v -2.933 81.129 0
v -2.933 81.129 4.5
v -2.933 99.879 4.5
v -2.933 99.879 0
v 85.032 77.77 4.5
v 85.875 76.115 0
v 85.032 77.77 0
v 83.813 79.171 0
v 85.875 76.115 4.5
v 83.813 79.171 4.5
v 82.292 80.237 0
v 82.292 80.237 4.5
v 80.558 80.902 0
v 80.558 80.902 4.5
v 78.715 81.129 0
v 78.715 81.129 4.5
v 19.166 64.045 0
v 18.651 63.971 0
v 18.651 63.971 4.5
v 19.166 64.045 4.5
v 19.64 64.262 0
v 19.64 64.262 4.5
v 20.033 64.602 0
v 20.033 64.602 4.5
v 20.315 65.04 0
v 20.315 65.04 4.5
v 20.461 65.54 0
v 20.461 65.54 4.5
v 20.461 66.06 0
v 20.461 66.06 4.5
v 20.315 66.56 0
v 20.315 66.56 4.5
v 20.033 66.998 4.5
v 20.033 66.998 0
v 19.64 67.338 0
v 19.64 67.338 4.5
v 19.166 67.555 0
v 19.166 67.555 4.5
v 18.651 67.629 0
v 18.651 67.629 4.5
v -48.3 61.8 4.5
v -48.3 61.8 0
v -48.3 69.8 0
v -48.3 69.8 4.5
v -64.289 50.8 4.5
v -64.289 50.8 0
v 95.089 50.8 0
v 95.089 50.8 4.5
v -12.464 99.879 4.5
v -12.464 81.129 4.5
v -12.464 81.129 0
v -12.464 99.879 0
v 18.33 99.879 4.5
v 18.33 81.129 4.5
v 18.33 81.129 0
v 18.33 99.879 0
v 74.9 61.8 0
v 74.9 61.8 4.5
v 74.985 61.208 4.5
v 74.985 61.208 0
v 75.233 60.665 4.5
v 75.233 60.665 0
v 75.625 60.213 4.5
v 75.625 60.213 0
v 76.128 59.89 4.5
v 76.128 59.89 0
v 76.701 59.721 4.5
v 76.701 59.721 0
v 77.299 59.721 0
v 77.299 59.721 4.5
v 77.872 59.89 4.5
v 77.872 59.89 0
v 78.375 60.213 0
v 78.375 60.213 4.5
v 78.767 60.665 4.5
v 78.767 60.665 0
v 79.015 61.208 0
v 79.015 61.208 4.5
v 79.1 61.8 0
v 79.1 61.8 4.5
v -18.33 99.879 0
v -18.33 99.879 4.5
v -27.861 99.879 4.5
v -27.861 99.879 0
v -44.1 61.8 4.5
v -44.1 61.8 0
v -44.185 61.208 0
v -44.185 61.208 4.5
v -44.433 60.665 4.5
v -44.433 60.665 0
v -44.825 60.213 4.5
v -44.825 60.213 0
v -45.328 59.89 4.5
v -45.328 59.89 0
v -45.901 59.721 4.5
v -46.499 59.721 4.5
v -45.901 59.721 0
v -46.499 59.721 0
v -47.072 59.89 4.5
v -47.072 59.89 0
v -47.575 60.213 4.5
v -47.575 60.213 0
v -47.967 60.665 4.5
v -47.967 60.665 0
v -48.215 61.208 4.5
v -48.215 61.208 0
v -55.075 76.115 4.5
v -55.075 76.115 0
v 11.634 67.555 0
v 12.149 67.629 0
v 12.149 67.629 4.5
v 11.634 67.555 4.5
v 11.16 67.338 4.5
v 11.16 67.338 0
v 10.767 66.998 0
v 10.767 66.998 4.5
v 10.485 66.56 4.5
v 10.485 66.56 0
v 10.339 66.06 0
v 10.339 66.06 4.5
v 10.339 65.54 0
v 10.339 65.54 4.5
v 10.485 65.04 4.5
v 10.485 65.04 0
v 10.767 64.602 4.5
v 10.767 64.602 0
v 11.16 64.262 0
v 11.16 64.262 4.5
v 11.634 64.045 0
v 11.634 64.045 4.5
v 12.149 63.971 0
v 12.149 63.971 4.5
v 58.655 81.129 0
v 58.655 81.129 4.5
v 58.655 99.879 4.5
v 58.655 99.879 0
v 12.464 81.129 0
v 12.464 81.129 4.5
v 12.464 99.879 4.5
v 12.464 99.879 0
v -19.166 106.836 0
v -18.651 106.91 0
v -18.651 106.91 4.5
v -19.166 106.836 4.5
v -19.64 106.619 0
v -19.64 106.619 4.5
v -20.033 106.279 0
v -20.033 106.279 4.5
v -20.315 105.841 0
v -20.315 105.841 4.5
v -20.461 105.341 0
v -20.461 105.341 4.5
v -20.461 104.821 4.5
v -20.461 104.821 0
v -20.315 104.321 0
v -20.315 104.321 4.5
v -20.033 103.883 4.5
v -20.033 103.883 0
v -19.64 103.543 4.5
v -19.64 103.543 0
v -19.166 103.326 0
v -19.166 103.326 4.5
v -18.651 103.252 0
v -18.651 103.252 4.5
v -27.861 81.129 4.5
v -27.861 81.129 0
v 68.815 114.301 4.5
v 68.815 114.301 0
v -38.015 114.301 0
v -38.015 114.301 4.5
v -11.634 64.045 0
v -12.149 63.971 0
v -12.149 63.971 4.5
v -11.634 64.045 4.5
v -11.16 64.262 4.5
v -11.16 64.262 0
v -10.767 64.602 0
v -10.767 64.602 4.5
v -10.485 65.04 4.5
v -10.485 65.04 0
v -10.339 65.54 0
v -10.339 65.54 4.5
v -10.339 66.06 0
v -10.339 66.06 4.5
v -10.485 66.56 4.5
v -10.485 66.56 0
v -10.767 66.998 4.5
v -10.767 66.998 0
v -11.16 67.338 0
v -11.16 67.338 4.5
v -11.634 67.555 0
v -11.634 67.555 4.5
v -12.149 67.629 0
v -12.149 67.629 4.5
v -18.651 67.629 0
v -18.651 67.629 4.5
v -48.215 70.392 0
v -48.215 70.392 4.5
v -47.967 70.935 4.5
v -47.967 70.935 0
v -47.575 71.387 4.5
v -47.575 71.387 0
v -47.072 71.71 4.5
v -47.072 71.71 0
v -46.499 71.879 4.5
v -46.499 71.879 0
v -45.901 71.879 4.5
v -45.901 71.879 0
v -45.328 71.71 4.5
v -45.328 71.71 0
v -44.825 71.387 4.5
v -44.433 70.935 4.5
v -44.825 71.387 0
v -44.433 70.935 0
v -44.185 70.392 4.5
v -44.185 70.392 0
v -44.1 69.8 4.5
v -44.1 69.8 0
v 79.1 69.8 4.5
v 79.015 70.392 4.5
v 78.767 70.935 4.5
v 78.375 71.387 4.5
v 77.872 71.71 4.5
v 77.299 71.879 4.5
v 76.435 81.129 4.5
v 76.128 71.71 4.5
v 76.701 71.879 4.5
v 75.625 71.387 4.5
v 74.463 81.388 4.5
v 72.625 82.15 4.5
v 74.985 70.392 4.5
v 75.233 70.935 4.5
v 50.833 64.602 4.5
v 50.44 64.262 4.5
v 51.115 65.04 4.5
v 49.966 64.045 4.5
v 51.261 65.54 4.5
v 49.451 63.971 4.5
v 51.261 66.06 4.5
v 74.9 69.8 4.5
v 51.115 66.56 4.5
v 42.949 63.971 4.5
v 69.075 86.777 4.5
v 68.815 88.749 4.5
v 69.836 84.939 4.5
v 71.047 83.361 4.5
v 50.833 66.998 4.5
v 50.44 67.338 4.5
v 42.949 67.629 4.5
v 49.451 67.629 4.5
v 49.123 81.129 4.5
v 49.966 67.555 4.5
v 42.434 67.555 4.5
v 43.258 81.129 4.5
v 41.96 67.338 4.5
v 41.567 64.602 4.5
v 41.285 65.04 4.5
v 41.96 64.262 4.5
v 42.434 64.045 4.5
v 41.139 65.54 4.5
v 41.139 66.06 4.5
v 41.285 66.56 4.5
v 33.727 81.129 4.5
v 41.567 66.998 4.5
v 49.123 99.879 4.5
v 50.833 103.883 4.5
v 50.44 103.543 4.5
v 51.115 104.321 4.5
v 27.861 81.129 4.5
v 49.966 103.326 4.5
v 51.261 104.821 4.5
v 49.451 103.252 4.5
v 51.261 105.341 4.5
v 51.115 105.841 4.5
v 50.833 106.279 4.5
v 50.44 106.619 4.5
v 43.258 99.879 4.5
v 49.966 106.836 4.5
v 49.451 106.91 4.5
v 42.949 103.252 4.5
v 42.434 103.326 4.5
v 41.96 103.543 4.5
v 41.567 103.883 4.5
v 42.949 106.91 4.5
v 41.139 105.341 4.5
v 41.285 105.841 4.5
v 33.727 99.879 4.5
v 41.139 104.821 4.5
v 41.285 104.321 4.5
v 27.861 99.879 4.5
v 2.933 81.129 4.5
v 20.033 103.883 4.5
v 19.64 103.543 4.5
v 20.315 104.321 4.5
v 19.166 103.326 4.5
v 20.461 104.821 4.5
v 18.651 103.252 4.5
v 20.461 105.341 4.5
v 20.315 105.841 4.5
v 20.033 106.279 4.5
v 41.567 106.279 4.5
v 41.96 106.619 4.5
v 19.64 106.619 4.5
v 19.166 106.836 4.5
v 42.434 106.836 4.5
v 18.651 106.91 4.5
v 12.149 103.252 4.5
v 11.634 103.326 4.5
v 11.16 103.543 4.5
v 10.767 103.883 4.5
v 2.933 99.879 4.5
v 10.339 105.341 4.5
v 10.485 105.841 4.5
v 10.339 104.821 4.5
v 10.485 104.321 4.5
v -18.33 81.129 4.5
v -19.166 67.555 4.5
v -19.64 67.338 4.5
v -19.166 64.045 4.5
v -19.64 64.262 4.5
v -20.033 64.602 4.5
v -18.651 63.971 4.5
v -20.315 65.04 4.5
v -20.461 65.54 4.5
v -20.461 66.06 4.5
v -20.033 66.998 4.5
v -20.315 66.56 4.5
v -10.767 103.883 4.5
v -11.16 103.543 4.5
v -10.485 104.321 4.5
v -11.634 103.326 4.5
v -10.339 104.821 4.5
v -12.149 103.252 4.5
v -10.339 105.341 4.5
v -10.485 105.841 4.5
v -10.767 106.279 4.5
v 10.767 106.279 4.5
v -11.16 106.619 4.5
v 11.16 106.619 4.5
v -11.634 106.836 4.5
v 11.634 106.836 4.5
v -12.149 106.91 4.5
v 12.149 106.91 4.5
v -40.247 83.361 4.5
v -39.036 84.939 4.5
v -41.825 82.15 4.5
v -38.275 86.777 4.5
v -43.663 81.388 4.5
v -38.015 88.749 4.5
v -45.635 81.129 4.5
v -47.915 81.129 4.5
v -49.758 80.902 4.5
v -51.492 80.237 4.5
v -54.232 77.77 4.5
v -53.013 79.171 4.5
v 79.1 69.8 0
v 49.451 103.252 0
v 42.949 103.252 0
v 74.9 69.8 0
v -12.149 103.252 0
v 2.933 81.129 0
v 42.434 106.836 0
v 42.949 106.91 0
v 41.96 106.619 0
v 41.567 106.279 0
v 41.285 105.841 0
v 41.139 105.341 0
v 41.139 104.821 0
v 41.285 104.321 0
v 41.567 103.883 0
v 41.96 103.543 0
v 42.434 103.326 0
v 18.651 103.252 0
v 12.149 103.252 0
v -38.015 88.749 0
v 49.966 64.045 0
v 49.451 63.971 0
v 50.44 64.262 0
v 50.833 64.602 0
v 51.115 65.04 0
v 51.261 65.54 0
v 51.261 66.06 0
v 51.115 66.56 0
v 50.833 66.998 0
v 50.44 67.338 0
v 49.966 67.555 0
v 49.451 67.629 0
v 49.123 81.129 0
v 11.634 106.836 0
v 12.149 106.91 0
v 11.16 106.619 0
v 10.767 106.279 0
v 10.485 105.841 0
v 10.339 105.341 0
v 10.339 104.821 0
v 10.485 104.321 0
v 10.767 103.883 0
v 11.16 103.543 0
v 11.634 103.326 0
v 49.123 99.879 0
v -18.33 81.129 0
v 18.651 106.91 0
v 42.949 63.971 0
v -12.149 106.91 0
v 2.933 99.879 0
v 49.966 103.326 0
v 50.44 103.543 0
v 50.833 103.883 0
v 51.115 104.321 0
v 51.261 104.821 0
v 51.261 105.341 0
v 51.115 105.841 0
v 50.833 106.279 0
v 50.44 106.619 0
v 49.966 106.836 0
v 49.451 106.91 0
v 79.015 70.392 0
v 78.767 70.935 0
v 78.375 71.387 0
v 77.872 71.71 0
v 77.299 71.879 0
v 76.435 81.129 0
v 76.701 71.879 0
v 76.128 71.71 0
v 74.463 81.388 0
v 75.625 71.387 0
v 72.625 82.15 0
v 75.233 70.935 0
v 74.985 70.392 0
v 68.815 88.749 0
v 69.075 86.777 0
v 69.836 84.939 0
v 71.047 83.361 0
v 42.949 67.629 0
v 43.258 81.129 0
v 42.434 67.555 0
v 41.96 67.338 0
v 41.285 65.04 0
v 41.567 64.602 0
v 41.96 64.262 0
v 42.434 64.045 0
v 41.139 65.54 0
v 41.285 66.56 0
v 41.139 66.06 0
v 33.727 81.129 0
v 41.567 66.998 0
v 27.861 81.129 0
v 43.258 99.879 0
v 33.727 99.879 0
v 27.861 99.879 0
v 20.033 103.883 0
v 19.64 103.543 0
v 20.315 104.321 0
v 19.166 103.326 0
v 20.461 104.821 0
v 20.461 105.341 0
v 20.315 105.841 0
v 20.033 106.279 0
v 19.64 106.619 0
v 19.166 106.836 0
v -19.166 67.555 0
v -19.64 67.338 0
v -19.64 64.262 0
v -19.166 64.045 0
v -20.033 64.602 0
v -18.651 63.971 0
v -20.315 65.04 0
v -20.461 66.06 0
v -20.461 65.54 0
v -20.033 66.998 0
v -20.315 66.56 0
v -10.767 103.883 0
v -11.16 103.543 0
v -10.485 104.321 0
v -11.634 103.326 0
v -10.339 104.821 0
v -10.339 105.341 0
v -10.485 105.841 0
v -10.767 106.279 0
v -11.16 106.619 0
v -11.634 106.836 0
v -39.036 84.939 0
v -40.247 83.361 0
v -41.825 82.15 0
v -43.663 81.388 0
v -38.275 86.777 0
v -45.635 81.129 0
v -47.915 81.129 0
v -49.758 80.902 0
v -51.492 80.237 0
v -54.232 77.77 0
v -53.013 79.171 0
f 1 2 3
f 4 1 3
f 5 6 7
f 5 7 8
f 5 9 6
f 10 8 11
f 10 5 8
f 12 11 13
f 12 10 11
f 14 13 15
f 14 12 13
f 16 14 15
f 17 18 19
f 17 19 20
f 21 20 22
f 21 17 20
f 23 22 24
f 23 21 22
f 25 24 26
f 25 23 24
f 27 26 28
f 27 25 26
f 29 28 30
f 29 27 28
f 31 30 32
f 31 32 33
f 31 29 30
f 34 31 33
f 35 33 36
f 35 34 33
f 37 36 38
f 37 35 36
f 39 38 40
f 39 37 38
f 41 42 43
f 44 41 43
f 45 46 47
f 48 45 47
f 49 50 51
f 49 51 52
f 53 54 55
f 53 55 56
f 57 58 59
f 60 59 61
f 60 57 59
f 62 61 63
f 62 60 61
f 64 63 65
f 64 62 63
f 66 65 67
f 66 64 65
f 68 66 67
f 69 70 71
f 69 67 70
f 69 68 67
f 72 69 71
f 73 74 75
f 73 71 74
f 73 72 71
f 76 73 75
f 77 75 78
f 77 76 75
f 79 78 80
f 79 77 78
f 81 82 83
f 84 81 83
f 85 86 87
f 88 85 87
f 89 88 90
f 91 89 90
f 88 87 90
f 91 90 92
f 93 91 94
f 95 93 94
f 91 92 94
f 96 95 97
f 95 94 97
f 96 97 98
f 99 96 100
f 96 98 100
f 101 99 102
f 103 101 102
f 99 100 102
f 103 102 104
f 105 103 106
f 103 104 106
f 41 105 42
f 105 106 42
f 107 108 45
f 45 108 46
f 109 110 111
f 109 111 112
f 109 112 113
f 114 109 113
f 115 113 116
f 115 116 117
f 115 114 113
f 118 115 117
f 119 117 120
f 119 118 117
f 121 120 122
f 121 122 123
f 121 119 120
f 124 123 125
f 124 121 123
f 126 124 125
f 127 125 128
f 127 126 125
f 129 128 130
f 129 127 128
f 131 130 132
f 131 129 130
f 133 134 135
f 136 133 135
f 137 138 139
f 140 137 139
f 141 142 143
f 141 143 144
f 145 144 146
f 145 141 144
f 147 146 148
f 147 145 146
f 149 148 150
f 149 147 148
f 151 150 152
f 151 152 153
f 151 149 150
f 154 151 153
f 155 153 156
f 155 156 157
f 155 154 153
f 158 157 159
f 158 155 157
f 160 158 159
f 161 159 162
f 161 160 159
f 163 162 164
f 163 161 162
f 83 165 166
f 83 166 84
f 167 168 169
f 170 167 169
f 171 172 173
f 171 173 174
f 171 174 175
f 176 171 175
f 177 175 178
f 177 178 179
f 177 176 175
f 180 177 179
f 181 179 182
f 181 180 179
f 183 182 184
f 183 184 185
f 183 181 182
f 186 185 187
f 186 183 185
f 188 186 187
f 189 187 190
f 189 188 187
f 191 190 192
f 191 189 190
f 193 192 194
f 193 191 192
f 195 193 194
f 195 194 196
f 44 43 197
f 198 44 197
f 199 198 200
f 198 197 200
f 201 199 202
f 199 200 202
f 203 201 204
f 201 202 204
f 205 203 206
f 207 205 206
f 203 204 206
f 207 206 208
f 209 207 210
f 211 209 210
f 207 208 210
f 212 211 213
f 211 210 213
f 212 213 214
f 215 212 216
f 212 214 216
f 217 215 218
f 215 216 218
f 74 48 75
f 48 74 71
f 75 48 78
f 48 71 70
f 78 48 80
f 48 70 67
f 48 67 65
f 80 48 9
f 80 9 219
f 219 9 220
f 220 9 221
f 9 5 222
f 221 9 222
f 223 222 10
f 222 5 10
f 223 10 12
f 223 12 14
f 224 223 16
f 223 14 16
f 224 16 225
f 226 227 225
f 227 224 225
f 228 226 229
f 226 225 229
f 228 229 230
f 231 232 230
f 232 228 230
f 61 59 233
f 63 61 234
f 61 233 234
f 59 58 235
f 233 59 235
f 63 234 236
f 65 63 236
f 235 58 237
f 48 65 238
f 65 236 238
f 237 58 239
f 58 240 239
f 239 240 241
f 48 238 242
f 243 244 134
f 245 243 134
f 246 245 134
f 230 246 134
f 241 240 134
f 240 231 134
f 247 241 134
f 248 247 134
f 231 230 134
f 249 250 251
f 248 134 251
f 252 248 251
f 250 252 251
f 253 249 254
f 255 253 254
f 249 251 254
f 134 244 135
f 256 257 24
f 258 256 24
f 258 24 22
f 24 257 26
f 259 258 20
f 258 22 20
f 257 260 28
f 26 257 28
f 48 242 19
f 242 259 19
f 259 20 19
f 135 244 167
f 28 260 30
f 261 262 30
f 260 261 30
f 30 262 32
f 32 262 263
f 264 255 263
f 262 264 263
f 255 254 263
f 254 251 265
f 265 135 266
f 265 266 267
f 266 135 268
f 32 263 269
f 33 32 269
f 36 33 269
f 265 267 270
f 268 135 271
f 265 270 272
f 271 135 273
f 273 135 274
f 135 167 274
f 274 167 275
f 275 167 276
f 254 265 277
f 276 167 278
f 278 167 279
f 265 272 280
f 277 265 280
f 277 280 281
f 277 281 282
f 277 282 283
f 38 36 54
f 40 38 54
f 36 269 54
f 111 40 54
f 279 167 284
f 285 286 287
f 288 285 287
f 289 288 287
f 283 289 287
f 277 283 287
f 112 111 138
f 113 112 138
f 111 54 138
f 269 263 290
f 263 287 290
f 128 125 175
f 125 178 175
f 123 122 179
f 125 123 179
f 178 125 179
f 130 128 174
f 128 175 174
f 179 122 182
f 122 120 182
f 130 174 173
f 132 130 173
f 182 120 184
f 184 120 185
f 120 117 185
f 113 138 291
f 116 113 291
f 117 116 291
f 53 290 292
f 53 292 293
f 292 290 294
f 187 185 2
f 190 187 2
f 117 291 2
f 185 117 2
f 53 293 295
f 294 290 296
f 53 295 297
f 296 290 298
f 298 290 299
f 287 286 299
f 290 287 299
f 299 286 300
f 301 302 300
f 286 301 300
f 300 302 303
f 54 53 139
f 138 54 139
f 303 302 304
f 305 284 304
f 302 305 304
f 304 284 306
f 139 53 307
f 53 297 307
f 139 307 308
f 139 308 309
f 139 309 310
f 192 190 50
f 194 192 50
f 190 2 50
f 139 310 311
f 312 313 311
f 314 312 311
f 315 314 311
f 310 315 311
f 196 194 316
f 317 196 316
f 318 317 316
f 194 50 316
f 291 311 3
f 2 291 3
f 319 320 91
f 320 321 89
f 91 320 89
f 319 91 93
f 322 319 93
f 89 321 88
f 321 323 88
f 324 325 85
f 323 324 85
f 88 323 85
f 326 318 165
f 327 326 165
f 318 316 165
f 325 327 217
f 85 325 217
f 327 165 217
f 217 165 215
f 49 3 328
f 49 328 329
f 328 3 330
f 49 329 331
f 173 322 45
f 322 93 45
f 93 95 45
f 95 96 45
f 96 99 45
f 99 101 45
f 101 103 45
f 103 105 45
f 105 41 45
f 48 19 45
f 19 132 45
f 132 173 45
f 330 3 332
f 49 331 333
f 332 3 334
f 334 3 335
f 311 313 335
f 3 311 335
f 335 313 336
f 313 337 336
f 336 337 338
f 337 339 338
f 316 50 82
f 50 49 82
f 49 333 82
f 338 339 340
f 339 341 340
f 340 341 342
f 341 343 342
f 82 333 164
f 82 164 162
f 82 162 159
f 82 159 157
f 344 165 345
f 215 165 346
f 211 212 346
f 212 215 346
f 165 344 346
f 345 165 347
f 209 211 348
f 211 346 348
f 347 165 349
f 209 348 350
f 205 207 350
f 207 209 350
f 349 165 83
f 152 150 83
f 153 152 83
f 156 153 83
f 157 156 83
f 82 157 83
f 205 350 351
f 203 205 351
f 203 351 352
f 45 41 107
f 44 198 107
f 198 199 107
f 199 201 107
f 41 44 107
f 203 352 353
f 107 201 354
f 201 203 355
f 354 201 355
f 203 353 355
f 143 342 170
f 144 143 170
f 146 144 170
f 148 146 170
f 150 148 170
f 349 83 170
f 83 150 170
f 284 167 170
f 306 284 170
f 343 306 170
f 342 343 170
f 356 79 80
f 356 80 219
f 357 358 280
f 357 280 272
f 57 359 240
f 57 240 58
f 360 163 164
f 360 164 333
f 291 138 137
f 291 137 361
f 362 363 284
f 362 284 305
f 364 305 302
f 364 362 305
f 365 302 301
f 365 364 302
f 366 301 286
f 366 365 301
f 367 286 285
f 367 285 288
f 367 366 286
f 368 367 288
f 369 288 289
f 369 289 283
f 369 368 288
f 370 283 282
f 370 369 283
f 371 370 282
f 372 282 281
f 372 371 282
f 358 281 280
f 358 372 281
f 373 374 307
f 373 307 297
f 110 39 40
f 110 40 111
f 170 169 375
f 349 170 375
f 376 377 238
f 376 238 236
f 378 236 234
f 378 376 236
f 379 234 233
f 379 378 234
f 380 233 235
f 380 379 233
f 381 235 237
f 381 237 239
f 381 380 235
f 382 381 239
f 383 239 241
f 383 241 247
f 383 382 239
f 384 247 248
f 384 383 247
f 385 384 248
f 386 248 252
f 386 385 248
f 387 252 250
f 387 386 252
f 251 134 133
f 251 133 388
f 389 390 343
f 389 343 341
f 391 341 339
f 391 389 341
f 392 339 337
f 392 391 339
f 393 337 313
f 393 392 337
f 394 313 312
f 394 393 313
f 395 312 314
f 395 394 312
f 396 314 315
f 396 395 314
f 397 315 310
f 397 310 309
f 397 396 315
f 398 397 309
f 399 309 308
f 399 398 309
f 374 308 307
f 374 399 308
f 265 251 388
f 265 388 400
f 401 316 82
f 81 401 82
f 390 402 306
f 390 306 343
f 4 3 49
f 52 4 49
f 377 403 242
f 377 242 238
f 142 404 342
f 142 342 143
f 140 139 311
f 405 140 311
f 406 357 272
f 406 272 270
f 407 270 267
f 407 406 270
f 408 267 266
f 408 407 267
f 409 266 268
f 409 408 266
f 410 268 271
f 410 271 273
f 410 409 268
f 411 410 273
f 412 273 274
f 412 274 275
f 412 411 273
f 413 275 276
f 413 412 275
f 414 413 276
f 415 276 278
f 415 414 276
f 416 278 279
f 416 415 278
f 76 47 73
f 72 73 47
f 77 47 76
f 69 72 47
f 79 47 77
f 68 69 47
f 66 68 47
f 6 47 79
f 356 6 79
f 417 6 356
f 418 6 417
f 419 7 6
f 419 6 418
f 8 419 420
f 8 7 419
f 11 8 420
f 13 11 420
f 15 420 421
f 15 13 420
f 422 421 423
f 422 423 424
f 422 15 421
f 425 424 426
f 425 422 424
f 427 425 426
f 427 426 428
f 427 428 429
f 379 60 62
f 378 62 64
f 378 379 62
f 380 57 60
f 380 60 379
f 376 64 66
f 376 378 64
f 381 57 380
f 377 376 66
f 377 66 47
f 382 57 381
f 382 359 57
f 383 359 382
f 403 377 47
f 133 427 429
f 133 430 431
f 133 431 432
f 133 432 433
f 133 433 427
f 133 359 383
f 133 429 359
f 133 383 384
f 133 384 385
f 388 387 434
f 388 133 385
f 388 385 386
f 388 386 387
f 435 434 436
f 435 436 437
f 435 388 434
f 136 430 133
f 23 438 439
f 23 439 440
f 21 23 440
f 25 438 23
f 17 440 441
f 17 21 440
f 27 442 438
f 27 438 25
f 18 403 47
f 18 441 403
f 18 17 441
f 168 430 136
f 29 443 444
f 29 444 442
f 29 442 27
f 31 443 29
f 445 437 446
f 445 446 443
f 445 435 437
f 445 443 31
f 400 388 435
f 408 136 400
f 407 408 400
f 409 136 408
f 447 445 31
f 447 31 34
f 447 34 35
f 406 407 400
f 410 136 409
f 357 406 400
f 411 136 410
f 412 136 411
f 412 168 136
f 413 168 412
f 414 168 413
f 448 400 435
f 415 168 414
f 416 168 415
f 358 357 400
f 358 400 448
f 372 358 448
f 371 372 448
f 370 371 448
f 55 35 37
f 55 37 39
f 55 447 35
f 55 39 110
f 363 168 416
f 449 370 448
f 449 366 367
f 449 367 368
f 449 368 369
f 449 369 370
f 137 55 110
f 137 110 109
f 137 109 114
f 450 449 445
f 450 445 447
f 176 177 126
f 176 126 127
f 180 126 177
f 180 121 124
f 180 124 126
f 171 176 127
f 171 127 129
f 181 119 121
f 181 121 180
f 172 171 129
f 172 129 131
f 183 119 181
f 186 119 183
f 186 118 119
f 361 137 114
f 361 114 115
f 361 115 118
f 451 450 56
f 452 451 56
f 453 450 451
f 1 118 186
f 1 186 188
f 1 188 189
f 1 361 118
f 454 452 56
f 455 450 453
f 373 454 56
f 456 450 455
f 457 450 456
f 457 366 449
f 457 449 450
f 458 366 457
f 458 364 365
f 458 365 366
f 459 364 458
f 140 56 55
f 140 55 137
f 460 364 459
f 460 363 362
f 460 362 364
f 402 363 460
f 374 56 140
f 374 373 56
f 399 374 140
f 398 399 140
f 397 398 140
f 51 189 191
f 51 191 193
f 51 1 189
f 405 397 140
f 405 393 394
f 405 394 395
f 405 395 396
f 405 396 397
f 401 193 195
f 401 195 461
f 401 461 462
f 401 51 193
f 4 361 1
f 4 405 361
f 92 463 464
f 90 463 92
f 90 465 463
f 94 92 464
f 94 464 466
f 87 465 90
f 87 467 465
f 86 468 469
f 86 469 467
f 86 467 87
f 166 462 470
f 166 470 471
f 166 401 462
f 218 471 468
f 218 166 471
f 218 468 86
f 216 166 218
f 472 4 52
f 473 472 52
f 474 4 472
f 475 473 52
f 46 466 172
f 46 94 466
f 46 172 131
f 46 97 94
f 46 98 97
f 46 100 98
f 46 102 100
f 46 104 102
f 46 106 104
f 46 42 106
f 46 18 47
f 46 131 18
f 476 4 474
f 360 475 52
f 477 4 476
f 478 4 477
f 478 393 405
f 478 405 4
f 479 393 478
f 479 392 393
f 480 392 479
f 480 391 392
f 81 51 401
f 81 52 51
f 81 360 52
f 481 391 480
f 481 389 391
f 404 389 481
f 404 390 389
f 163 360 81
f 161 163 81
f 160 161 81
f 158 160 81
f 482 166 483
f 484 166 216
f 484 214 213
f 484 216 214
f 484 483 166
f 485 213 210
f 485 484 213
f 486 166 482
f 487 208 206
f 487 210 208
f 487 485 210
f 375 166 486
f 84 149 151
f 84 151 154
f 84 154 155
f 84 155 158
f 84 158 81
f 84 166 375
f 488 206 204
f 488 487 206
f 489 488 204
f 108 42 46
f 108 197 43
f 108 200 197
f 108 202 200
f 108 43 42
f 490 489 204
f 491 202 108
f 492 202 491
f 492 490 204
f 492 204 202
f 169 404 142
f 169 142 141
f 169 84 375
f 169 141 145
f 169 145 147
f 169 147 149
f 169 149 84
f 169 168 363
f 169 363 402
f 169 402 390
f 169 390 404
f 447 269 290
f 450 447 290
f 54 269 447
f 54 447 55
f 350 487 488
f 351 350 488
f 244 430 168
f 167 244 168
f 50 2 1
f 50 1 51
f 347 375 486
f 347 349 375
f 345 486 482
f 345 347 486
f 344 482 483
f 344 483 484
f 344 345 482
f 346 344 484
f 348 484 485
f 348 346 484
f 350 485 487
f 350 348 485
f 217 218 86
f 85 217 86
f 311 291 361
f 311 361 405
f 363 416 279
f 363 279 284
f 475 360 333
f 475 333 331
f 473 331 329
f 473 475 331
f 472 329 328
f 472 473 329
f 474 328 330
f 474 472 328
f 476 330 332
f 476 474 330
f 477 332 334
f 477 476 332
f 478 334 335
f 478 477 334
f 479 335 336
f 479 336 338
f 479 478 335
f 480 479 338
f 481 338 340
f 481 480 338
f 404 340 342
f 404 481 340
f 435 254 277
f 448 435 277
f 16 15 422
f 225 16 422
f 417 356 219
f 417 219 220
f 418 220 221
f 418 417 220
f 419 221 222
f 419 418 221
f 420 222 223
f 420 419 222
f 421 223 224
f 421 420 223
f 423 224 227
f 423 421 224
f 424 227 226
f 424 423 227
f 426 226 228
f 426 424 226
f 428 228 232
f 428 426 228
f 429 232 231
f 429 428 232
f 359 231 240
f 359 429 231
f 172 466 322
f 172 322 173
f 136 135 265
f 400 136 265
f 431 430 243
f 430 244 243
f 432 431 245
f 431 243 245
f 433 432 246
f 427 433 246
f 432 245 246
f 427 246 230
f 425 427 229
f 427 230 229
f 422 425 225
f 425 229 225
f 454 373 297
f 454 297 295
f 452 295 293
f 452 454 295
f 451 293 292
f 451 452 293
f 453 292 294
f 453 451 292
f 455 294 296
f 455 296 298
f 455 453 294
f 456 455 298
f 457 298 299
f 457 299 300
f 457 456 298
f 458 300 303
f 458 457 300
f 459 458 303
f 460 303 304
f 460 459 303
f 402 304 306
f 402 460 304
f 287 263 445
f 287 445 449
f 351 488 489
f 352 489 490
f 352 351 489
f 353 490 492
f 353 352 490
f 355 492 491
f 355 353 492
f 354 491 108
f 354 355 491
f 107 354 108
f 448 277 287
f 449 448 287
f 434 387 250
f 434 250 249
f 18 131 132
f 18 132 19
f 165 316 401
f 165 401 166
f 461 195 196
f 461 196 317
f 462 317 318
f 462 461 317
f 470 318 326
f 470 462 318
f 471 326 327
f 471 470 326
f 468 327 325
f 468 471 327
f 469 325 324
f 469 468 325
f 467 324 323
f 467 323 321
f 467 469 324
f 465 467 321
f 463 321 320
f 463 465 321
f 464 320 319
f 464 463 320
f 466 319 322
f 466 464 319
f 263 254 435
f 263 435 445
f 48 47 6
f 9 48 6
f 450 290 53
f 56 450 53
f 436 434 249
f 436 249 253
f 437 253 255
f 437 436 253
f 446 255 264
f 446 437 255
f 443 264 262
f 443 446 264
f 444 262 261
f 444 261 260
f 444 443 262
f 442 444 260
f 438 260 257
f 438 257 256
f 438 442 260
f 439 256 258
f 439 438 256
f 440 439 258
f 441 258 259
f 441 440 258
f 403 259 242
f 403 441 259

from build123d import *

# Parameters (mm, degrees)
SKETCH1_W                           = 198.43248
SKETCH1_H                           = 59.281
SKETCH1_R                           = 1.5
BOSS_EXTRUDE1_DEPTH                 = 4.5
SKETCH4_W                           = 9.531640124
SKETCH4_H                           = 18.749999962
SKETCH4_W_2                         = 9.531640123
CUT_EXTRUDE2_DEPTH                  = 149.263073085
CUT_EXTRUDE3_DEPTH                  = 149.263073085
SKETCH6_W                           = 198.43248
SKETCH6_H                           = 4.22
BOSS_EXTRUDE2_DEPTH                 = 4.5
CUT_EXTRUDE4_DEPTH                  = 152.422689452
FILLET1_R                           = 7.62
F_27_0_144_DIAMETER_SLOT1_OUTLINE_R = 1.5
F_27_0_144_DIAMETER_SLOT1_DEPTH     = 4.5


# Read off the part's stored shape, not the designer's step: #27 (0.144) Diameter Slot1
with BuildPart() as part:
    # Sketch1 → Boss-Extrude1 (new body)
    with BuildSketch(Plane.XY):
        with Locations((0, 80.4405)):
            Rectangle(SKETCH1_W, SKETCH1_H)
        with Locations((46.2, 105.081)):
            Circle(SKETCH1_R, mode=Mode.SUBTRACT)
        with Locations((46.2, 65.8)):
            Circle(SKETCH1_R, mode=Mode.SUBTRACT)
        with Locations((15.4, 65.8)):
            Circle(SKETCH1_R, mode=Mode.SUBTRACT)
        with Locations((15.4, 105.081)):
            Circle(SKETCH1_R, mode=Mode.SUBTRACT)
        with Locations((-15.4, 105.081)):
            Circle(SKETCH1_R, mode=Mode.SUBTRACT)
        with Locations((-15.4, 65.8)):
            Circle(SKETCH1_R, mode=Mode.SUBTRACT)
    extrude(amount=BOSS_EXTRUDE1_DEPTH)

    # Sketch4 → Cut-Extrude2 (cut, through all)
    with BuildSketch(Plane(origin=(0, 0, 4.5), x_dir=(-1, 0, 0), z_dir=(0, 0, -1))):
        with Locations((-53.889258182, 90.503714938)):
            Rectangle(SKETCH4_W, SKETCH4_H)
        with Locations((-38.492327273, 90.503714938)):
            Rectangle(SKETCH4_W, SKETCH4_H)
        with Locations((-23.095396364, 90.503714938)):
            Rectangle(SKETCH4_W_2, SKETCH4_H)
        with Locations((-7.698465454, 90.503714938)):
            Rectangle(SKETCH4_W_2, SKETCH4_H)
        with Locations((7.698465454, 90.503714938)):
            Rectangle(SKETCH4_W_2, SKETCH4_H)
        with Locations((23.095396364, 90.503714938)):
            Rectangle(SKETCH4_W_2, SKETCH4_H)
    extrude(amount=CUT_EXTRUDE2_DEPTH, mode=Mode.SUBTRACT)

    # Sketch5 → Cut-Extrude3 (cut, through all)
    with BuildSketch(Plane(origin=(0, 0, 0), x_dir=(-1, 0, 0), z_dir=(0, 0, -1))):
        with BuildLine():
            Line((-74.899953, 69.8), (-74.899953, 61.8))
            ThreePointArc((-74.899953, 61.8), (-76.999953, 59.7), (-79.099953, 61.8))
            Line((-79.099953, 61.8), (-79.099953, 69.8))
            ThreePointArc((-79.099953, 69.8), (-76.999953, 71.9), (-74.899953, 69.8))
        make_face()
        with BuildLine():
            Line((44.099953, 69.8), (44.099953, 61.8))
            ThreePointArc((44.099953, 61.8), (46.199953, 59.7), (48.299953, 61.8))
            Line((48.299953, 61.8), (48.299953, 69.8))
            ThreePointArc((48.299953, 69.8), (46.199953, 71.9), (44.099953, 69.8))
        make_face()
    extrude(amount=-CUT_EXTRUDE3_DEPTH, mode=Mode.SUBTRACT)

    # Sketch6 → Boss-Extrude2 (add)
    with BuildSketch(Plane(origin=(0, 0, 0), x_dir=(-1, 0, 0), z_dir=(0, 0, -1))):
        with Locations((0, 112.191)):
            Rectangle(SKETCH6_W, SKETCH6_H)
    extrude(amount=-BOSS_EXTRUDE2_DEPTH)

    # Sketch7 → Cut-Extrude4 (cut, through all)
    with BuildSketch(Plane(origin=(0, 0, 0), x_dir=(-1, 0, 0), z_dir=(0, 0, -1))):
        Polygon((-68.815078244, 114.301), (-99.21624, 114.301), (-99.21624, 50.8), (-95.088898012, 50.8), (-84.050148524, 81.128714957), (-68.815078244, 81.128714957), align=None)
        Polygon((99.21624, 114.301), (38.015078244, 114.301), (38.015078244, 81.128714957), (53.250148524, 81.128714957), (64.288898012, 50.8), (99.21624, 50.8), align=None)
    extrude(amount=-CUT_EXTRUDE4_DEPTH, mode=Mode.SUBTRACT)

    # Fillet1
    fillet1_edges = [part.edges().sort_by_distance(p)[0] for p in [
        (84.050148524, 81.128714957, 2.25),
        (68.815078244, 81.128714957, 2.25),
        (-53.250148524, 81.128714957, 2.25),
        (-38.015078244, 81.128714957, 2.25),
    ]]
    fillet(fillet1_edges, radius=FILLET1_R)

    # #27 (0.144) Diameter Slot1 outline → #27 (0.144) Diameter Slot1 (cut)
    # profile 1 of 6: a face of its own
    with BuildSketch(Plane.XY):
        with BuildLine():
            ThreePointArc((49.4512, 103.2522), (51.28, 105.081), (49.4512, 106.9098))
            Line((49.4512, 106.9098), (42.9488, 106.9098))
            ThreePointArc((42.9488, 106.9098), (41.12, 105.081), (42.9488, 103.2522))
            Line((42.9488, 103.2522), (49.4512, 103.2522))
        make_face()
        with Locations((46.2, 105.081)):
            Circle(F_27_0_144_DIAMETER_SLOT1_OUTLINE_R, mode=Mode.SUBTRACT)
    # profile 2 of 6: a face of its own
    with BuildSketch(Plane.XY):
        with BuildLine():
            ThreePointArc((12.1488, 106.9098), (10.32, 105.081), (12.1488, 103.2522))
            Line((12.1488, 103.2522), (18.6512, 103.2522))
            ThreePointArc((18.6512, 103.2522), (20.48, 105.081), (18.6512, 106.9098))
            Line((18.6512, 106.9098), (12.1488, 106.9098))
        make_face()
        with Locations((15.4, 105.081)):
            Circle(F_27_0_144_DIAMETER_SLOT1_OUTLINE_R, mode=Mode.SUBTRACT)
    # profile 3 of 6: a face of its own
    with BuildSketch(Plane.XY):
        with BuildLine():
            ThreePointArc((-18.6512, 106.9098), (-20.48, 105.081), (-18.6512, 103.2522))
            Line((-18.6512, 103.2522), (-12.1488, 103.2522))
            ThreePointArc((-12.1488, 103.2522), (-10.32, 105.081), (-12.1488, 106.9098))
            Line((-12.1488, 106.9098), (-18.6512, 106.9098))
        make_face()
        with Locations((-15.4, 105.081)):
            Circle(F_27_0_144_DIAMETER_SLOT1_OUTLINE_R, mode=Mode.SUBTRACT)
    # profile 4 of 6: a face of its own
    with BuildSketch(Plane.XY):
        with BuildLine():
            ThreePointArc((-12.1488, 63.9712), (-10.32, 65.8), (-12.1488, 67.6288))
            Line((-12.1488, 67.6288), (-18.6512, 67.6288))
            ThreePointArc((-18.6512, 67.6288), (-20.48, 65.8), (-18.6512, 63.9712))
            Line((-18.6512, 63.9712), (-12.1488, 63.9712))
        make_face()
        with Locations((-15.4, 65.8)):
            Circle(F_27_0_144_DIAMETER_SLOT1_OUTLINE_R, mode=Mode.SUBTRACT)
    # profile 5 of 6: a face of its own
    with BuildSketch(Plane.XY):
        with BuildLine():
            ThreePointArc((12.1488, 67.6288), (10.32, 65.8), (12.1488, 63.9712))
            Line((12.1488, 63.9712), (18.6512, 63.9712))
            ThreePointArc((18.6512, 63.9712), (20.48, 65.8), (18.6512, 67.6288))
            Line((18.6512, 67.6288), (12.1488, 67.6288))
        make_face()
        with Locations((15.4, 65.8)):
            Circle(F_27_0_144_DIAMETER_SLOT1_OUTLINE_R, mode=Mode.SUBTRACT)
    # profile 6 of 6: a face of its own
    with BuildSketch(Plane.XY):
        with BuildLine():
            ThreePointArc((42.9488, 67.6288), (41.12, 65.8), (42.9488, 63.9712))
            Line((42.9488, 63.9712), (49.4512, 63.9712))
            ThreePointArc((49.4512, 63.9712), (51.28, 65.8), (49.4512, 67.6288))
            Line((49.4512, 67.6288), (42.9488, 67.6288))
        make_face()
        with Locations((46.2, 65.8)):
            Circle(F_27_0_144_DIAMETER_SLOT1_OUTLINE_R, mode=Mode.SUBTRACT)
    extrude(amount=F_27_0_144_DIAMETER_SLOT1_DEPTH, mode=Mode.SUBTRACT)


solid = part.part
